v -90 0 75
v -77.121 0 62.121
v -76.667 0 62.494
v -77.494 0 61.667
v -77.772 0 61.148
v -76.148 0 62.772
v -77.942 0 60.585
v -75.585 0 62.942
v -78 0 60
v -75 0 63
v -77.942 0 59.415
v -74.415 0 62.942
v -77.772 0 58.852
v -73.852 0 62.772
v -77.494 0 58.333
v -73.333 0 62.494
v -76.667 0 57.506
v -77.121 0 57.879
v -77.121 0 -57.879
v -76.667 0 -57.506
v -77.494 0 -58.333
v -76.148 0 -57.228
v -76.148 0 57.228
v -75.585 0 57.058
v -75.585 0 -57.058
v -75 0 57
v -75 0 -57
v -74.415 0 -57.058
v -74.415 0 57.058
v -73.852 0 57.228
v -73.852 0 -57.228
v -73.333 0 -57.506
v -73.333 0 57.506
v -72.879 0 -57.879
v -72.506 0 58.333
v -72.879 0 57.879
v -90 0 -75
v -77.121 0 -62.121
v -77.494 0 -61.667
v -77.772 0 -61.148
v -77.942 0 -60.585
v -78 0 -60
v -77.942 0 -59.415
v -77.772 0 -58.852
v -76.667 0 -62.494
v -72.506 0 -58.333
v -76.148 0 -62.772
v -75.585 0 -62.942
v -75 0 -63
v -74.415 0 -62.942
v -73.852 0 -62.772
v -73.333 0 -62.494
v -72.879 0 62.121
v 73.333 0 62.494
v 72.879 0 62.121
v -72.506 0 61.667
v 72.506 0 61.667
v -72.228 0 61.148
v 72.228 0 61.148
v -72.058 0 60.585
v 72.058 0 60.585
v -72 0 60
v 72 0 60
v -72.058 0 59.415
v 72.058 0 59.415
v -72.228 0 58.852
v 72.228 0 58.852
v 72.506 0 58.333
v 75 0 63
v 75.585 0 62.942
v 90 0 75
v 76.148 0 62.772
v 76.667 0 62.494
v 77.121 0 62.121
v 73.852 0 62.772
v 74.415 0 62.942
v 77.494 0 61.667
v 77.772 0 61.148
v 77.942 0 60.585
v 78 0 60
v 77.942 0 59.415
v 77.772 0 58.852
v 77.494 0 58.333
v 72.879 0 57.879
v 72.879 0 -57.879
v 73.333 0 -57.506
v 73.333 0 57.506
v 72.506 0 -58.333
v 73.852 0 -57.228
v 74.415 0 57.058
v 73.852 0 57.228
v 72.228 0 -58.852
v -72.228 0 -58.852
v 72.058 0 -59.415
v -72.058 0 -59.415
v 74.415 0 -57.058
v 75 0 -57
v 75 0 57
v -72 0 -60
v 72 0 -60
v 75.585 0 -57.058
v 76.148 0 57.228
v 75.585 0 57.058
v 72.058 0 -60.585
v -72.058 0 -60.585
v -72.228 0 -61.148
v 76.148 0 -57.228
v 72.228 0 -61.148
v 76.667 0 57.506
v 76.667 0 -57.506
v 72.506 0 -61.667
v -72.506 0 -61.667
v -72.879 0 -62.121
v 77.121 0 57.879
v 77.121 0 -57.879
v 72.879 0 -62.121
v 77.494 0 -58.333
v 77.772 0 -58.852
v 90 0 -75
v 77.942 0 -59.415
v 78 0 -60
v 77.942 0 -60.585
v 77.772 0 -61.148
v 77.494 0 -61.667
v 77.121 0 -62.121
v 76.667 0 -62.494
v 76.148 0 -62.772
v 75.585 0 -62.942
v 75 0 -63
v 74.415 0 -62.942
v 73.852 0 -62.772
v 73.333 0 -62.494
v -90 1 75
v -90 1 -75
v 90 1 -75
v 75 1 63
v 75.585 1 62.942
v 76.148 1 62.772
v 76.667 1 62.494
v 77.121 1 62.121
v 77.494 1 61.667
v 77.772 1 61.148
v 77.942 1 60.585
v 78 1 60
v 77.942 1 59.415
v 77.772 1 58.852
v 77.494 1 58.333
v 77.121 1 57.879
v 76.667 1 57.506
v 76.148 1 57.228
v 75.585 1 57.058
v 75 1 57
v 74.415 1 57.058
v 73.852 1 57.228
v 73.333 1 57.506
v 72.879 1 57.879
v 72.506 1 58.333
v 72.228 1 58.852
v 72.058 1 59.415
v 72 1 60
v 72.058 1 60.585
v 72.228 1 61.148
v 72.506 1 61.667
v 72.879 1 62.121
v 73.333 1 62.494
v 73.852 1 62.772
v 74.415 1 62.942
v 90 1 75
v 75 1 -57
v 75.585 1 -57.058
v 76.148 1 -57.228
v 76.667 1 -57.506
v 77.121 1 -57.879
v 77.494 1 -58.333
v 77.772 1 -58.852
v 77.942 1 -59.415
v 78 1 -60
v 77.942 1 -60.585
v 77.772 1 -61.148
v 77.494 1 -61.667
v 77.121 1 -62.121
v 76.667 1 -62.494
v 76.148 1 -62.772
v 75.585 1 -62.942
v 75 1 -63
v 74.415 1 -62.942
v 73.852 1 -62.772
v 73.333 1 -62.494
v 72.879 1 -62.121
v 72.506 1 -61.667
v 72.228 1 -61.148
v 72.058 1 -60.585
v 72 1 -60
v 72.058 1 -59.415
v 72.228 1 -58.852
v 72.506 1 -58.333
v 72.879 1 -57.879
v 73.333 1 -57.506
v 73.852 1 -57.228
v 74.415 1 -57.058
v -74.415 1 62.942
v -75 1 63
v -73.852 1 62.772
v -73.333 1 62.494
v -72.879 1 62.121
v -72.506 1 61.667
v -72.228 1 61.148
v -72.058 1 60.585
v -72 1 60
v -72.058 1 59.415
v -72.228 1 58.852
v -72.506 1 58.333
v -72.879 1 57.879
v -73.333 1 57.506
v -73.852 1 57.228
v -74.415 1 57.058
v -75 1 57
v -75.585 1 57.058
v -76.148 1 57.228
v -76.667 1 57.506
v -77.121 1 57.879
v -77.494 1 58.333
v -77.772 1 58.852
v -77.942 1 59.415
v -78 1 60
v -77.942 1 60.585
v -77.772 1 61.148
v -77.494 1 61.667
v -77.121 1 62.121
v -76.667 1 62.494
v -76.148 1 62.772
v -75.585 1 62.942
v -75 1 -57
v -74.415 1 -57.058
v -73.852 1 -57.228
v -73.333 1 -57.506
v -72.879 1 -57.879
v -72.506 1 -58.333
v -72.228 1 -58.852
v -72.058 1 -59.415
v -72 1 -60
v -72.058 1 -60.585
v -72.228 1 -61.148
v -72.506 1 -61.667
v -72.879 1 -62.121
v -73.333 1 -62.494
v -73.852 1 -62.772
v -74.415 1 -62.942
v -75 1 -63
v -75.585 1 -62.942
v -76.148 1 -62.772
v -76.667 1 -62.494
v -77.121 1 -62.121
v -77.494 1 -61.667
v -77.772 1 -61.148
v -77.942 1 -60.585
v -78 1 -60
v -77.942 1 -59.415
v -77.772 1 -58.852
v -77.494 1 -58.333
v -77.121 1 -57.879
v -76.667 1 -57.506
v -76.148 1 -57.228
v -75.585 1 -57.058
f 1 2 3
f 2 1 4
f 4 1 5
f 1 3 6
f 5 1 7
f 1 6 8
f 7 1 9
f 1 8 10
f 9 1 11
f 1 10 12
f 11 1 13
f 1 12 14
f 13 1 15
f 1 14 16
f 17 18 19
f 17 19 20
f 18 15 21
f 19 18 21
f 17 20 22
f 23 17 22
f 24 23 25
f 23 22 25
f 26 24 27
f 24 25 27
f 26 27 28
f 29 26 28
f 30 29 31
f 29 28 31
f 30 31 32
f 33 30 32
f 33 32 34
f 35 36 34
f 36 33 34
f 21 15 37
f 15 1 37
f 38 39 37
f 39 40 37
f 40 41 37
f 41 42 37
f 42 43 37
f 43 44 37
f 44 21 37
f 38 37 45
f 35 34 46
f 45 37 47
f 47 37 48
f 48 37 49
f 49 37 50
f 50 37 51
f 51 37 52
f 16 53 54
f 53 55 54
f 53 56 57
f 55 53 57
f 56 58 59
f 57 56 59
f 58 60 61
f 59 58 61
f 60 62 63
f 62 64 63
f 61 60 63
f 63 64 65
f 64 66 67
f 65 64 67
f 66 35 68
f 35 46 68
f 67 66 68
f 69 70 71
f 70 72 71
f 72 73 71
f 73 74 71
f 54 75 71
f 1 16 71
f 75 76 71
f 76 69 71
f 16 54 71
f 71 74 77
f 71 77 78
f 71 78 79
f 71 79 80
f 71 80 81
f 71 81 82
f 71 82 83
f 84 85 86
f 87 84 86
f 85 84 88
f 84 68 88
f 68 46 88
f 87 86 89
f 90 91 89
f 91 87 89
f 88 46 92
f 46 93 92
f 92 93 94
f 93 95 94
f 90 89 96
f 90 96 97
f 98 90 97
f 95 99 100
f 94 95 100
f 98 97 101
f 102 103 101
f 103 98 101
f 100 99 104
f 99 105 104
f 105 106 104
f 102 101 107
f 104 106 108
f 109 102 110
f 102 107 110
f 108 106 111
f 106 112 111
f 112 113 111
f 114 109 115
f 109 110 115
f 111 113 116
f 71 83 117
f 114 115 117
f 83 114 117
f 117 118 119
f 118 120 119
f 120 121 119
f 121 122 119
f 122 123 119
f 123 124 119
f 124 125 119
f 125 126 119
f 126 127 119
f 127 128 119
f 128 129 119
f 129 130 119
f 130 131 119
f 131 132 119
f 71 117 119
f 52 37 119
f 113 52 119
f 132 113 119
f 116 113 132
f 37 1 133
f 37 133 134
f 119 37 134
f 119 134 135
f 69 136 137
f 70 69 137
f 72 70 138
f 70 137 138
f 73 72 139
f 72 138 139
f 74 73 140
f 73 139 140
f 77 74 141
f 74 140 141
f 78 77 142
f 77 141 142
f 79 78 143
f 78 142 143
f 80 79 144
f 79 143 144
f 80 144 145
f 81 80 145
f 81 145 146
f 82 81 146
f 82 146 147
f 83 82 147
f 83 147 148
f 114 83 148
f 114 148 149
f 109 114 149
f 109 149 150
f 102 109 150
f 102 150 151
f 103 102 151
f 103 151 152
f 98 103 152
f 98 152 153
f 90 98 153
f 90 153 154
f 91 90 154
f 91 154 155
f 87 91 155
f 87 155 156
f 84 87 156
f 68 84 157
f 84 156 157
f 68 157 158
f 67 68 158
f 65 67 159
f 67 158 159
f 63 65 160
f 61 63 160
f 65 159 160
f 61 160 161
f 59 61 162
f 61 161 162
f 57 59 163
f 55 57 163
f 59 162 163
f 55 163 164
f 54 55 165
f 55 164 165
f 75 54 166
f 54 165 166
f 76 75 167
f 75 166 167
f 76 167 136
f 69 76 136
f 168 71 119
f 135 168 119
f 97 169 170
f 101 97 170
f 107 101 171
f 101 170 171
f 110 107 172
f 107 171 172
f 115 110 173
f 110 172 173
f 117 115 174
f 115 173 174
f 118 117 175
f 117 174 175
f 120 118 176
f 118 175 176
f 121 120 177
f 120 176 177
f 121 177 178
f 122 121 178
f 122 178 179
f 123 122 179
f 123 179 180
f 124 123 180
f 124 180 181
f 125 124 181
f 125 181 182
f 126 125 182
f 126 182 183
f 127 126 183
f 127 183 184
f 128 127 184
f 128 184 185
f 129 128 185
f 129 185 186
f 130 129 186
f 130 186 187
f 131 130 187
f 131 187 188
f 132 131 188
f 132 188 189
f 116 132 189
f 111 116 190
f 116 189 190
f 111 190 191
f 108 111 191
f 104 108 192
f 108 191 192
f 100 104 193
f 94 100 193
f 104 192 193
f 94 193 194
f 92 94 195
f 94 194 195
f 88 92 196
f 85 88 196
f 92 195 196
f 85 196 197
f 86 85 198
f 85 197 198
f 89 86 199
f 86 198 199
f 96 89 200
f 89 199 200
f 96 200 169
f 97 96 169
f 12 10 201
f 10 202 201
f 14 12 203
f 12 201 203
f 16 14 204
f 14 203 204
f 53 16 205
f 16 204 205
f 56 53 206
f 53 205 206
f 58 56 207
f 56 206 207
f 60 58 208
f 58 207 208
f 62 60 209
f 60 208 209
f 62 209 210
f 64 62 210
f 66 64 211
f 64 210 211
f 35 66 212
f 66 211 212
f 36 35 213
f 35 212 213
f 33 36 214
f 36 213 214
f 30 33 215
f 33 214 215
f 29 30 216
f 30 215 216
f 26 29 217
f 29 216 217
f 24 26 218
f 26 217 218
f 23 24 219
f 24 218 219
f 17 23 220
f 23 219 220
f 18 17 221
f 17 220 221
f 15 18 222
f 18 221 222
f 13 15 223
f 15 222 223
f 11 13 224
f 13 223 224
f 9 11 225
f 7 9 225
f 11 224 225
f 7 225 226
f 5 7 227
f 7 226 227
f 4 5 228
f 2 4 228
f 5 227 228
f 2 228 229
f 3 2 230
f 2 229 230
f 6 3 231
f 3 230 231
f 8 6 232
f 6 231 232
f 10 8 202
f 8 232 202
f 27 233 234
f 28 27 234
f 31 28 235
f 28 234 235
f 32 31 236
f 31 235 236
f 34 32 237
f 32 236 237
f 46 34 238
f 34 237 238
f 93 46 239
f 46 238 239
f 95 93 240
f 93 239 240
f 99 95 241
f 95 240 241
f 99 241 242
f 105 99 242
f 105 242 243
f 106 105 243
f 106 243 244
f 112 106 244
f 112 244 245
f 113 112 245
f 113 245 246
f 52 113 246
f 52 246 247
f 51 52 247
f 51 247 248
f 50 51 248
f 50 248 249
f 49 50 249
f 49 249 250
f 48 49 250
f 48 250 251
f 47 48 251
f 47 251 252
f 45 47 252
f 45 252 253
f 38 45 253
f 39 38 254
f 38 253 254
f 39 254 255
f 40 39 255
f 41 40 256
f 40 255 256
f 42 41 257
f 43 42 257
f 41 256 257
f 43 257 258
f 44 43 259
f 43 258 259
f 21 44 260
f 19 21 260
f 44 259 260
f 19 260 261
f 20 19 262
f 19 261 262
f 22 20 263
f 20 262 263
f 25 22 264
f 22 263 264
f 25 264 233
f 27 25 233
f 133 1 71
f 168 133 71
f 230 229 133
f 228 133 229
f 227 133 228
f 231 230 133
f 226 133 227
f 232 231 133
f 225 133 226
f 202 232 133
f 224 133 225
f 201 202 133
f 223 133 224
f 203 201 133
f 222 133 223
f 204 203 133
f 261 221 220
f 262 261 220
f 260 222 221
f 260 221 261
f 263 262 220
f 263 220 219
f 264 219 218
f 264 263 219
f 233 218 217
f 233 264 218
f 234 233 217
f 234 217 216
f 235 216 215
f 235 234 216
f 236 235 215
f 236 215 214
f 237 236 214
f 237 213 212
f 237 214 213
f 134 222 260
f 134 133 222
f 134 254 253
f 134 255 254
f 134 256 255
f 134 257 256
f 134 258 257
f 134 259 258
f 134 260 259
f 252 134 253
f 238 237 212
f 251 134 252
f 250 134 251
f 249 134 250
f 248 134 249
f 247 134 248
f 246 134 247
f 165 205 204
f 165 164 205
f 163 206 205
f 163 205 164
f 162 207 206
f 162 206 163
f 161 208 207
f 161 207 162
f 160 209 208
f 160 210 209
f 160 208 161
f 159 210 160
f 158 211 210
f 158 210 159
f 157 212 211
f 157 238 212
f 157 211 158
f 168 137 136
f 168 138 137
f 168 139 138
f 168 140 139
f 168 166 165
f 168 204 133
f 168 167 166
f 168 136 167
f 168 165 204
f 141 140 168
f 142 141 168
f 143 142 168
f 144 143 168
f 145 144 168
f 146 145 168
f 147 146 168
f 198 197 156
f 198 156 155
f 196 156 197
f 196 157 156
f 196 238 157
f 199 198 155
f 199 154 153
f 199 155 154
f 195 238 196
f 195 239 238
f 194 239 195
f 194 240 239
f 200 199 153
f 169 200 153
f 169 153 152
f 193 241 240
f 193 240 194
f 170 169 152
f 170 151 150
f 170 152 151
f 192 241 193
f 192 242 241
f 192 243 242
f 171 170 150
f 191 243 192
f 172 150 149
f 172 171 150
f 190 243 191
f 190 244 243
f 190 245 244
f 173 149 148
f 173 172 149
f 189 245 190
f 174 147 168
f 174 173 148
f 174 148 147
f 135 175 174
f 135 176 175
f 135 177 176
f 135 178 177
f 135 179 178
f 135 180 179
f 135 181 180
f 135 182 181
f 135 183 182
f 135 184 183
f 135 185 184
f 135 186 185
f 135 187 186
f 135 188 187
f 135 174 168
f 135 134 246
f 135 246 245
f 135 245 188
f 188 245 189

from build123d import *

# Parameters (mm, degrees)
IZIM1_W                     = 180
IZIM1_H                     = 150
Y_KSEKLIK_EKSTR_ZYON1_DEPTH = 1
IZIM2_R                     = 3
KES_EKSTR_ZYON1_DEPTH       = 25


with BuildPart() as part:
    # Çizim1 → Yükseklik-Ekstrüzyon1 (new body)
    with BuildSketch(Plane(origin=(0, 0, 0), x_dir=(1, 0, 0), z_dir=(0, 1, 0))):
        Rectangle(IZIM1_W, IZIM1_H)
    extrude(amount=Y_KSEKLIK_EKSTR_ZYON1_DEPTH)

    # Çizim2 → Kes-Ekstrüzyon1 (cut, symmetric)
    with BuildSketch(Plane(origin=(0, 1, 0), x_dir=(1, 0, 0), z_dir=(0, 1, 0))):
        with Locations(Location((-75, 60, 0), (0, 0, 270))):
            Circle(IZIM2_R)
        with Locations(Location((75, 60, 0), (0, 0, 270))):
            Circle(IZIM2_R)
        with Locations(Location((75, -60, 0), (0, 0, 270))):
            Circle(IZIM2_R)
        with Locations(Location((-75, -60, 0), (0, 0, 270))):
            Circle(IZIM2_R)
    extrude(amount=KES_EKSTR_ZYON1_DEPTH, both=True, mode=Mode.SUBTRACT)


solid = part.part
